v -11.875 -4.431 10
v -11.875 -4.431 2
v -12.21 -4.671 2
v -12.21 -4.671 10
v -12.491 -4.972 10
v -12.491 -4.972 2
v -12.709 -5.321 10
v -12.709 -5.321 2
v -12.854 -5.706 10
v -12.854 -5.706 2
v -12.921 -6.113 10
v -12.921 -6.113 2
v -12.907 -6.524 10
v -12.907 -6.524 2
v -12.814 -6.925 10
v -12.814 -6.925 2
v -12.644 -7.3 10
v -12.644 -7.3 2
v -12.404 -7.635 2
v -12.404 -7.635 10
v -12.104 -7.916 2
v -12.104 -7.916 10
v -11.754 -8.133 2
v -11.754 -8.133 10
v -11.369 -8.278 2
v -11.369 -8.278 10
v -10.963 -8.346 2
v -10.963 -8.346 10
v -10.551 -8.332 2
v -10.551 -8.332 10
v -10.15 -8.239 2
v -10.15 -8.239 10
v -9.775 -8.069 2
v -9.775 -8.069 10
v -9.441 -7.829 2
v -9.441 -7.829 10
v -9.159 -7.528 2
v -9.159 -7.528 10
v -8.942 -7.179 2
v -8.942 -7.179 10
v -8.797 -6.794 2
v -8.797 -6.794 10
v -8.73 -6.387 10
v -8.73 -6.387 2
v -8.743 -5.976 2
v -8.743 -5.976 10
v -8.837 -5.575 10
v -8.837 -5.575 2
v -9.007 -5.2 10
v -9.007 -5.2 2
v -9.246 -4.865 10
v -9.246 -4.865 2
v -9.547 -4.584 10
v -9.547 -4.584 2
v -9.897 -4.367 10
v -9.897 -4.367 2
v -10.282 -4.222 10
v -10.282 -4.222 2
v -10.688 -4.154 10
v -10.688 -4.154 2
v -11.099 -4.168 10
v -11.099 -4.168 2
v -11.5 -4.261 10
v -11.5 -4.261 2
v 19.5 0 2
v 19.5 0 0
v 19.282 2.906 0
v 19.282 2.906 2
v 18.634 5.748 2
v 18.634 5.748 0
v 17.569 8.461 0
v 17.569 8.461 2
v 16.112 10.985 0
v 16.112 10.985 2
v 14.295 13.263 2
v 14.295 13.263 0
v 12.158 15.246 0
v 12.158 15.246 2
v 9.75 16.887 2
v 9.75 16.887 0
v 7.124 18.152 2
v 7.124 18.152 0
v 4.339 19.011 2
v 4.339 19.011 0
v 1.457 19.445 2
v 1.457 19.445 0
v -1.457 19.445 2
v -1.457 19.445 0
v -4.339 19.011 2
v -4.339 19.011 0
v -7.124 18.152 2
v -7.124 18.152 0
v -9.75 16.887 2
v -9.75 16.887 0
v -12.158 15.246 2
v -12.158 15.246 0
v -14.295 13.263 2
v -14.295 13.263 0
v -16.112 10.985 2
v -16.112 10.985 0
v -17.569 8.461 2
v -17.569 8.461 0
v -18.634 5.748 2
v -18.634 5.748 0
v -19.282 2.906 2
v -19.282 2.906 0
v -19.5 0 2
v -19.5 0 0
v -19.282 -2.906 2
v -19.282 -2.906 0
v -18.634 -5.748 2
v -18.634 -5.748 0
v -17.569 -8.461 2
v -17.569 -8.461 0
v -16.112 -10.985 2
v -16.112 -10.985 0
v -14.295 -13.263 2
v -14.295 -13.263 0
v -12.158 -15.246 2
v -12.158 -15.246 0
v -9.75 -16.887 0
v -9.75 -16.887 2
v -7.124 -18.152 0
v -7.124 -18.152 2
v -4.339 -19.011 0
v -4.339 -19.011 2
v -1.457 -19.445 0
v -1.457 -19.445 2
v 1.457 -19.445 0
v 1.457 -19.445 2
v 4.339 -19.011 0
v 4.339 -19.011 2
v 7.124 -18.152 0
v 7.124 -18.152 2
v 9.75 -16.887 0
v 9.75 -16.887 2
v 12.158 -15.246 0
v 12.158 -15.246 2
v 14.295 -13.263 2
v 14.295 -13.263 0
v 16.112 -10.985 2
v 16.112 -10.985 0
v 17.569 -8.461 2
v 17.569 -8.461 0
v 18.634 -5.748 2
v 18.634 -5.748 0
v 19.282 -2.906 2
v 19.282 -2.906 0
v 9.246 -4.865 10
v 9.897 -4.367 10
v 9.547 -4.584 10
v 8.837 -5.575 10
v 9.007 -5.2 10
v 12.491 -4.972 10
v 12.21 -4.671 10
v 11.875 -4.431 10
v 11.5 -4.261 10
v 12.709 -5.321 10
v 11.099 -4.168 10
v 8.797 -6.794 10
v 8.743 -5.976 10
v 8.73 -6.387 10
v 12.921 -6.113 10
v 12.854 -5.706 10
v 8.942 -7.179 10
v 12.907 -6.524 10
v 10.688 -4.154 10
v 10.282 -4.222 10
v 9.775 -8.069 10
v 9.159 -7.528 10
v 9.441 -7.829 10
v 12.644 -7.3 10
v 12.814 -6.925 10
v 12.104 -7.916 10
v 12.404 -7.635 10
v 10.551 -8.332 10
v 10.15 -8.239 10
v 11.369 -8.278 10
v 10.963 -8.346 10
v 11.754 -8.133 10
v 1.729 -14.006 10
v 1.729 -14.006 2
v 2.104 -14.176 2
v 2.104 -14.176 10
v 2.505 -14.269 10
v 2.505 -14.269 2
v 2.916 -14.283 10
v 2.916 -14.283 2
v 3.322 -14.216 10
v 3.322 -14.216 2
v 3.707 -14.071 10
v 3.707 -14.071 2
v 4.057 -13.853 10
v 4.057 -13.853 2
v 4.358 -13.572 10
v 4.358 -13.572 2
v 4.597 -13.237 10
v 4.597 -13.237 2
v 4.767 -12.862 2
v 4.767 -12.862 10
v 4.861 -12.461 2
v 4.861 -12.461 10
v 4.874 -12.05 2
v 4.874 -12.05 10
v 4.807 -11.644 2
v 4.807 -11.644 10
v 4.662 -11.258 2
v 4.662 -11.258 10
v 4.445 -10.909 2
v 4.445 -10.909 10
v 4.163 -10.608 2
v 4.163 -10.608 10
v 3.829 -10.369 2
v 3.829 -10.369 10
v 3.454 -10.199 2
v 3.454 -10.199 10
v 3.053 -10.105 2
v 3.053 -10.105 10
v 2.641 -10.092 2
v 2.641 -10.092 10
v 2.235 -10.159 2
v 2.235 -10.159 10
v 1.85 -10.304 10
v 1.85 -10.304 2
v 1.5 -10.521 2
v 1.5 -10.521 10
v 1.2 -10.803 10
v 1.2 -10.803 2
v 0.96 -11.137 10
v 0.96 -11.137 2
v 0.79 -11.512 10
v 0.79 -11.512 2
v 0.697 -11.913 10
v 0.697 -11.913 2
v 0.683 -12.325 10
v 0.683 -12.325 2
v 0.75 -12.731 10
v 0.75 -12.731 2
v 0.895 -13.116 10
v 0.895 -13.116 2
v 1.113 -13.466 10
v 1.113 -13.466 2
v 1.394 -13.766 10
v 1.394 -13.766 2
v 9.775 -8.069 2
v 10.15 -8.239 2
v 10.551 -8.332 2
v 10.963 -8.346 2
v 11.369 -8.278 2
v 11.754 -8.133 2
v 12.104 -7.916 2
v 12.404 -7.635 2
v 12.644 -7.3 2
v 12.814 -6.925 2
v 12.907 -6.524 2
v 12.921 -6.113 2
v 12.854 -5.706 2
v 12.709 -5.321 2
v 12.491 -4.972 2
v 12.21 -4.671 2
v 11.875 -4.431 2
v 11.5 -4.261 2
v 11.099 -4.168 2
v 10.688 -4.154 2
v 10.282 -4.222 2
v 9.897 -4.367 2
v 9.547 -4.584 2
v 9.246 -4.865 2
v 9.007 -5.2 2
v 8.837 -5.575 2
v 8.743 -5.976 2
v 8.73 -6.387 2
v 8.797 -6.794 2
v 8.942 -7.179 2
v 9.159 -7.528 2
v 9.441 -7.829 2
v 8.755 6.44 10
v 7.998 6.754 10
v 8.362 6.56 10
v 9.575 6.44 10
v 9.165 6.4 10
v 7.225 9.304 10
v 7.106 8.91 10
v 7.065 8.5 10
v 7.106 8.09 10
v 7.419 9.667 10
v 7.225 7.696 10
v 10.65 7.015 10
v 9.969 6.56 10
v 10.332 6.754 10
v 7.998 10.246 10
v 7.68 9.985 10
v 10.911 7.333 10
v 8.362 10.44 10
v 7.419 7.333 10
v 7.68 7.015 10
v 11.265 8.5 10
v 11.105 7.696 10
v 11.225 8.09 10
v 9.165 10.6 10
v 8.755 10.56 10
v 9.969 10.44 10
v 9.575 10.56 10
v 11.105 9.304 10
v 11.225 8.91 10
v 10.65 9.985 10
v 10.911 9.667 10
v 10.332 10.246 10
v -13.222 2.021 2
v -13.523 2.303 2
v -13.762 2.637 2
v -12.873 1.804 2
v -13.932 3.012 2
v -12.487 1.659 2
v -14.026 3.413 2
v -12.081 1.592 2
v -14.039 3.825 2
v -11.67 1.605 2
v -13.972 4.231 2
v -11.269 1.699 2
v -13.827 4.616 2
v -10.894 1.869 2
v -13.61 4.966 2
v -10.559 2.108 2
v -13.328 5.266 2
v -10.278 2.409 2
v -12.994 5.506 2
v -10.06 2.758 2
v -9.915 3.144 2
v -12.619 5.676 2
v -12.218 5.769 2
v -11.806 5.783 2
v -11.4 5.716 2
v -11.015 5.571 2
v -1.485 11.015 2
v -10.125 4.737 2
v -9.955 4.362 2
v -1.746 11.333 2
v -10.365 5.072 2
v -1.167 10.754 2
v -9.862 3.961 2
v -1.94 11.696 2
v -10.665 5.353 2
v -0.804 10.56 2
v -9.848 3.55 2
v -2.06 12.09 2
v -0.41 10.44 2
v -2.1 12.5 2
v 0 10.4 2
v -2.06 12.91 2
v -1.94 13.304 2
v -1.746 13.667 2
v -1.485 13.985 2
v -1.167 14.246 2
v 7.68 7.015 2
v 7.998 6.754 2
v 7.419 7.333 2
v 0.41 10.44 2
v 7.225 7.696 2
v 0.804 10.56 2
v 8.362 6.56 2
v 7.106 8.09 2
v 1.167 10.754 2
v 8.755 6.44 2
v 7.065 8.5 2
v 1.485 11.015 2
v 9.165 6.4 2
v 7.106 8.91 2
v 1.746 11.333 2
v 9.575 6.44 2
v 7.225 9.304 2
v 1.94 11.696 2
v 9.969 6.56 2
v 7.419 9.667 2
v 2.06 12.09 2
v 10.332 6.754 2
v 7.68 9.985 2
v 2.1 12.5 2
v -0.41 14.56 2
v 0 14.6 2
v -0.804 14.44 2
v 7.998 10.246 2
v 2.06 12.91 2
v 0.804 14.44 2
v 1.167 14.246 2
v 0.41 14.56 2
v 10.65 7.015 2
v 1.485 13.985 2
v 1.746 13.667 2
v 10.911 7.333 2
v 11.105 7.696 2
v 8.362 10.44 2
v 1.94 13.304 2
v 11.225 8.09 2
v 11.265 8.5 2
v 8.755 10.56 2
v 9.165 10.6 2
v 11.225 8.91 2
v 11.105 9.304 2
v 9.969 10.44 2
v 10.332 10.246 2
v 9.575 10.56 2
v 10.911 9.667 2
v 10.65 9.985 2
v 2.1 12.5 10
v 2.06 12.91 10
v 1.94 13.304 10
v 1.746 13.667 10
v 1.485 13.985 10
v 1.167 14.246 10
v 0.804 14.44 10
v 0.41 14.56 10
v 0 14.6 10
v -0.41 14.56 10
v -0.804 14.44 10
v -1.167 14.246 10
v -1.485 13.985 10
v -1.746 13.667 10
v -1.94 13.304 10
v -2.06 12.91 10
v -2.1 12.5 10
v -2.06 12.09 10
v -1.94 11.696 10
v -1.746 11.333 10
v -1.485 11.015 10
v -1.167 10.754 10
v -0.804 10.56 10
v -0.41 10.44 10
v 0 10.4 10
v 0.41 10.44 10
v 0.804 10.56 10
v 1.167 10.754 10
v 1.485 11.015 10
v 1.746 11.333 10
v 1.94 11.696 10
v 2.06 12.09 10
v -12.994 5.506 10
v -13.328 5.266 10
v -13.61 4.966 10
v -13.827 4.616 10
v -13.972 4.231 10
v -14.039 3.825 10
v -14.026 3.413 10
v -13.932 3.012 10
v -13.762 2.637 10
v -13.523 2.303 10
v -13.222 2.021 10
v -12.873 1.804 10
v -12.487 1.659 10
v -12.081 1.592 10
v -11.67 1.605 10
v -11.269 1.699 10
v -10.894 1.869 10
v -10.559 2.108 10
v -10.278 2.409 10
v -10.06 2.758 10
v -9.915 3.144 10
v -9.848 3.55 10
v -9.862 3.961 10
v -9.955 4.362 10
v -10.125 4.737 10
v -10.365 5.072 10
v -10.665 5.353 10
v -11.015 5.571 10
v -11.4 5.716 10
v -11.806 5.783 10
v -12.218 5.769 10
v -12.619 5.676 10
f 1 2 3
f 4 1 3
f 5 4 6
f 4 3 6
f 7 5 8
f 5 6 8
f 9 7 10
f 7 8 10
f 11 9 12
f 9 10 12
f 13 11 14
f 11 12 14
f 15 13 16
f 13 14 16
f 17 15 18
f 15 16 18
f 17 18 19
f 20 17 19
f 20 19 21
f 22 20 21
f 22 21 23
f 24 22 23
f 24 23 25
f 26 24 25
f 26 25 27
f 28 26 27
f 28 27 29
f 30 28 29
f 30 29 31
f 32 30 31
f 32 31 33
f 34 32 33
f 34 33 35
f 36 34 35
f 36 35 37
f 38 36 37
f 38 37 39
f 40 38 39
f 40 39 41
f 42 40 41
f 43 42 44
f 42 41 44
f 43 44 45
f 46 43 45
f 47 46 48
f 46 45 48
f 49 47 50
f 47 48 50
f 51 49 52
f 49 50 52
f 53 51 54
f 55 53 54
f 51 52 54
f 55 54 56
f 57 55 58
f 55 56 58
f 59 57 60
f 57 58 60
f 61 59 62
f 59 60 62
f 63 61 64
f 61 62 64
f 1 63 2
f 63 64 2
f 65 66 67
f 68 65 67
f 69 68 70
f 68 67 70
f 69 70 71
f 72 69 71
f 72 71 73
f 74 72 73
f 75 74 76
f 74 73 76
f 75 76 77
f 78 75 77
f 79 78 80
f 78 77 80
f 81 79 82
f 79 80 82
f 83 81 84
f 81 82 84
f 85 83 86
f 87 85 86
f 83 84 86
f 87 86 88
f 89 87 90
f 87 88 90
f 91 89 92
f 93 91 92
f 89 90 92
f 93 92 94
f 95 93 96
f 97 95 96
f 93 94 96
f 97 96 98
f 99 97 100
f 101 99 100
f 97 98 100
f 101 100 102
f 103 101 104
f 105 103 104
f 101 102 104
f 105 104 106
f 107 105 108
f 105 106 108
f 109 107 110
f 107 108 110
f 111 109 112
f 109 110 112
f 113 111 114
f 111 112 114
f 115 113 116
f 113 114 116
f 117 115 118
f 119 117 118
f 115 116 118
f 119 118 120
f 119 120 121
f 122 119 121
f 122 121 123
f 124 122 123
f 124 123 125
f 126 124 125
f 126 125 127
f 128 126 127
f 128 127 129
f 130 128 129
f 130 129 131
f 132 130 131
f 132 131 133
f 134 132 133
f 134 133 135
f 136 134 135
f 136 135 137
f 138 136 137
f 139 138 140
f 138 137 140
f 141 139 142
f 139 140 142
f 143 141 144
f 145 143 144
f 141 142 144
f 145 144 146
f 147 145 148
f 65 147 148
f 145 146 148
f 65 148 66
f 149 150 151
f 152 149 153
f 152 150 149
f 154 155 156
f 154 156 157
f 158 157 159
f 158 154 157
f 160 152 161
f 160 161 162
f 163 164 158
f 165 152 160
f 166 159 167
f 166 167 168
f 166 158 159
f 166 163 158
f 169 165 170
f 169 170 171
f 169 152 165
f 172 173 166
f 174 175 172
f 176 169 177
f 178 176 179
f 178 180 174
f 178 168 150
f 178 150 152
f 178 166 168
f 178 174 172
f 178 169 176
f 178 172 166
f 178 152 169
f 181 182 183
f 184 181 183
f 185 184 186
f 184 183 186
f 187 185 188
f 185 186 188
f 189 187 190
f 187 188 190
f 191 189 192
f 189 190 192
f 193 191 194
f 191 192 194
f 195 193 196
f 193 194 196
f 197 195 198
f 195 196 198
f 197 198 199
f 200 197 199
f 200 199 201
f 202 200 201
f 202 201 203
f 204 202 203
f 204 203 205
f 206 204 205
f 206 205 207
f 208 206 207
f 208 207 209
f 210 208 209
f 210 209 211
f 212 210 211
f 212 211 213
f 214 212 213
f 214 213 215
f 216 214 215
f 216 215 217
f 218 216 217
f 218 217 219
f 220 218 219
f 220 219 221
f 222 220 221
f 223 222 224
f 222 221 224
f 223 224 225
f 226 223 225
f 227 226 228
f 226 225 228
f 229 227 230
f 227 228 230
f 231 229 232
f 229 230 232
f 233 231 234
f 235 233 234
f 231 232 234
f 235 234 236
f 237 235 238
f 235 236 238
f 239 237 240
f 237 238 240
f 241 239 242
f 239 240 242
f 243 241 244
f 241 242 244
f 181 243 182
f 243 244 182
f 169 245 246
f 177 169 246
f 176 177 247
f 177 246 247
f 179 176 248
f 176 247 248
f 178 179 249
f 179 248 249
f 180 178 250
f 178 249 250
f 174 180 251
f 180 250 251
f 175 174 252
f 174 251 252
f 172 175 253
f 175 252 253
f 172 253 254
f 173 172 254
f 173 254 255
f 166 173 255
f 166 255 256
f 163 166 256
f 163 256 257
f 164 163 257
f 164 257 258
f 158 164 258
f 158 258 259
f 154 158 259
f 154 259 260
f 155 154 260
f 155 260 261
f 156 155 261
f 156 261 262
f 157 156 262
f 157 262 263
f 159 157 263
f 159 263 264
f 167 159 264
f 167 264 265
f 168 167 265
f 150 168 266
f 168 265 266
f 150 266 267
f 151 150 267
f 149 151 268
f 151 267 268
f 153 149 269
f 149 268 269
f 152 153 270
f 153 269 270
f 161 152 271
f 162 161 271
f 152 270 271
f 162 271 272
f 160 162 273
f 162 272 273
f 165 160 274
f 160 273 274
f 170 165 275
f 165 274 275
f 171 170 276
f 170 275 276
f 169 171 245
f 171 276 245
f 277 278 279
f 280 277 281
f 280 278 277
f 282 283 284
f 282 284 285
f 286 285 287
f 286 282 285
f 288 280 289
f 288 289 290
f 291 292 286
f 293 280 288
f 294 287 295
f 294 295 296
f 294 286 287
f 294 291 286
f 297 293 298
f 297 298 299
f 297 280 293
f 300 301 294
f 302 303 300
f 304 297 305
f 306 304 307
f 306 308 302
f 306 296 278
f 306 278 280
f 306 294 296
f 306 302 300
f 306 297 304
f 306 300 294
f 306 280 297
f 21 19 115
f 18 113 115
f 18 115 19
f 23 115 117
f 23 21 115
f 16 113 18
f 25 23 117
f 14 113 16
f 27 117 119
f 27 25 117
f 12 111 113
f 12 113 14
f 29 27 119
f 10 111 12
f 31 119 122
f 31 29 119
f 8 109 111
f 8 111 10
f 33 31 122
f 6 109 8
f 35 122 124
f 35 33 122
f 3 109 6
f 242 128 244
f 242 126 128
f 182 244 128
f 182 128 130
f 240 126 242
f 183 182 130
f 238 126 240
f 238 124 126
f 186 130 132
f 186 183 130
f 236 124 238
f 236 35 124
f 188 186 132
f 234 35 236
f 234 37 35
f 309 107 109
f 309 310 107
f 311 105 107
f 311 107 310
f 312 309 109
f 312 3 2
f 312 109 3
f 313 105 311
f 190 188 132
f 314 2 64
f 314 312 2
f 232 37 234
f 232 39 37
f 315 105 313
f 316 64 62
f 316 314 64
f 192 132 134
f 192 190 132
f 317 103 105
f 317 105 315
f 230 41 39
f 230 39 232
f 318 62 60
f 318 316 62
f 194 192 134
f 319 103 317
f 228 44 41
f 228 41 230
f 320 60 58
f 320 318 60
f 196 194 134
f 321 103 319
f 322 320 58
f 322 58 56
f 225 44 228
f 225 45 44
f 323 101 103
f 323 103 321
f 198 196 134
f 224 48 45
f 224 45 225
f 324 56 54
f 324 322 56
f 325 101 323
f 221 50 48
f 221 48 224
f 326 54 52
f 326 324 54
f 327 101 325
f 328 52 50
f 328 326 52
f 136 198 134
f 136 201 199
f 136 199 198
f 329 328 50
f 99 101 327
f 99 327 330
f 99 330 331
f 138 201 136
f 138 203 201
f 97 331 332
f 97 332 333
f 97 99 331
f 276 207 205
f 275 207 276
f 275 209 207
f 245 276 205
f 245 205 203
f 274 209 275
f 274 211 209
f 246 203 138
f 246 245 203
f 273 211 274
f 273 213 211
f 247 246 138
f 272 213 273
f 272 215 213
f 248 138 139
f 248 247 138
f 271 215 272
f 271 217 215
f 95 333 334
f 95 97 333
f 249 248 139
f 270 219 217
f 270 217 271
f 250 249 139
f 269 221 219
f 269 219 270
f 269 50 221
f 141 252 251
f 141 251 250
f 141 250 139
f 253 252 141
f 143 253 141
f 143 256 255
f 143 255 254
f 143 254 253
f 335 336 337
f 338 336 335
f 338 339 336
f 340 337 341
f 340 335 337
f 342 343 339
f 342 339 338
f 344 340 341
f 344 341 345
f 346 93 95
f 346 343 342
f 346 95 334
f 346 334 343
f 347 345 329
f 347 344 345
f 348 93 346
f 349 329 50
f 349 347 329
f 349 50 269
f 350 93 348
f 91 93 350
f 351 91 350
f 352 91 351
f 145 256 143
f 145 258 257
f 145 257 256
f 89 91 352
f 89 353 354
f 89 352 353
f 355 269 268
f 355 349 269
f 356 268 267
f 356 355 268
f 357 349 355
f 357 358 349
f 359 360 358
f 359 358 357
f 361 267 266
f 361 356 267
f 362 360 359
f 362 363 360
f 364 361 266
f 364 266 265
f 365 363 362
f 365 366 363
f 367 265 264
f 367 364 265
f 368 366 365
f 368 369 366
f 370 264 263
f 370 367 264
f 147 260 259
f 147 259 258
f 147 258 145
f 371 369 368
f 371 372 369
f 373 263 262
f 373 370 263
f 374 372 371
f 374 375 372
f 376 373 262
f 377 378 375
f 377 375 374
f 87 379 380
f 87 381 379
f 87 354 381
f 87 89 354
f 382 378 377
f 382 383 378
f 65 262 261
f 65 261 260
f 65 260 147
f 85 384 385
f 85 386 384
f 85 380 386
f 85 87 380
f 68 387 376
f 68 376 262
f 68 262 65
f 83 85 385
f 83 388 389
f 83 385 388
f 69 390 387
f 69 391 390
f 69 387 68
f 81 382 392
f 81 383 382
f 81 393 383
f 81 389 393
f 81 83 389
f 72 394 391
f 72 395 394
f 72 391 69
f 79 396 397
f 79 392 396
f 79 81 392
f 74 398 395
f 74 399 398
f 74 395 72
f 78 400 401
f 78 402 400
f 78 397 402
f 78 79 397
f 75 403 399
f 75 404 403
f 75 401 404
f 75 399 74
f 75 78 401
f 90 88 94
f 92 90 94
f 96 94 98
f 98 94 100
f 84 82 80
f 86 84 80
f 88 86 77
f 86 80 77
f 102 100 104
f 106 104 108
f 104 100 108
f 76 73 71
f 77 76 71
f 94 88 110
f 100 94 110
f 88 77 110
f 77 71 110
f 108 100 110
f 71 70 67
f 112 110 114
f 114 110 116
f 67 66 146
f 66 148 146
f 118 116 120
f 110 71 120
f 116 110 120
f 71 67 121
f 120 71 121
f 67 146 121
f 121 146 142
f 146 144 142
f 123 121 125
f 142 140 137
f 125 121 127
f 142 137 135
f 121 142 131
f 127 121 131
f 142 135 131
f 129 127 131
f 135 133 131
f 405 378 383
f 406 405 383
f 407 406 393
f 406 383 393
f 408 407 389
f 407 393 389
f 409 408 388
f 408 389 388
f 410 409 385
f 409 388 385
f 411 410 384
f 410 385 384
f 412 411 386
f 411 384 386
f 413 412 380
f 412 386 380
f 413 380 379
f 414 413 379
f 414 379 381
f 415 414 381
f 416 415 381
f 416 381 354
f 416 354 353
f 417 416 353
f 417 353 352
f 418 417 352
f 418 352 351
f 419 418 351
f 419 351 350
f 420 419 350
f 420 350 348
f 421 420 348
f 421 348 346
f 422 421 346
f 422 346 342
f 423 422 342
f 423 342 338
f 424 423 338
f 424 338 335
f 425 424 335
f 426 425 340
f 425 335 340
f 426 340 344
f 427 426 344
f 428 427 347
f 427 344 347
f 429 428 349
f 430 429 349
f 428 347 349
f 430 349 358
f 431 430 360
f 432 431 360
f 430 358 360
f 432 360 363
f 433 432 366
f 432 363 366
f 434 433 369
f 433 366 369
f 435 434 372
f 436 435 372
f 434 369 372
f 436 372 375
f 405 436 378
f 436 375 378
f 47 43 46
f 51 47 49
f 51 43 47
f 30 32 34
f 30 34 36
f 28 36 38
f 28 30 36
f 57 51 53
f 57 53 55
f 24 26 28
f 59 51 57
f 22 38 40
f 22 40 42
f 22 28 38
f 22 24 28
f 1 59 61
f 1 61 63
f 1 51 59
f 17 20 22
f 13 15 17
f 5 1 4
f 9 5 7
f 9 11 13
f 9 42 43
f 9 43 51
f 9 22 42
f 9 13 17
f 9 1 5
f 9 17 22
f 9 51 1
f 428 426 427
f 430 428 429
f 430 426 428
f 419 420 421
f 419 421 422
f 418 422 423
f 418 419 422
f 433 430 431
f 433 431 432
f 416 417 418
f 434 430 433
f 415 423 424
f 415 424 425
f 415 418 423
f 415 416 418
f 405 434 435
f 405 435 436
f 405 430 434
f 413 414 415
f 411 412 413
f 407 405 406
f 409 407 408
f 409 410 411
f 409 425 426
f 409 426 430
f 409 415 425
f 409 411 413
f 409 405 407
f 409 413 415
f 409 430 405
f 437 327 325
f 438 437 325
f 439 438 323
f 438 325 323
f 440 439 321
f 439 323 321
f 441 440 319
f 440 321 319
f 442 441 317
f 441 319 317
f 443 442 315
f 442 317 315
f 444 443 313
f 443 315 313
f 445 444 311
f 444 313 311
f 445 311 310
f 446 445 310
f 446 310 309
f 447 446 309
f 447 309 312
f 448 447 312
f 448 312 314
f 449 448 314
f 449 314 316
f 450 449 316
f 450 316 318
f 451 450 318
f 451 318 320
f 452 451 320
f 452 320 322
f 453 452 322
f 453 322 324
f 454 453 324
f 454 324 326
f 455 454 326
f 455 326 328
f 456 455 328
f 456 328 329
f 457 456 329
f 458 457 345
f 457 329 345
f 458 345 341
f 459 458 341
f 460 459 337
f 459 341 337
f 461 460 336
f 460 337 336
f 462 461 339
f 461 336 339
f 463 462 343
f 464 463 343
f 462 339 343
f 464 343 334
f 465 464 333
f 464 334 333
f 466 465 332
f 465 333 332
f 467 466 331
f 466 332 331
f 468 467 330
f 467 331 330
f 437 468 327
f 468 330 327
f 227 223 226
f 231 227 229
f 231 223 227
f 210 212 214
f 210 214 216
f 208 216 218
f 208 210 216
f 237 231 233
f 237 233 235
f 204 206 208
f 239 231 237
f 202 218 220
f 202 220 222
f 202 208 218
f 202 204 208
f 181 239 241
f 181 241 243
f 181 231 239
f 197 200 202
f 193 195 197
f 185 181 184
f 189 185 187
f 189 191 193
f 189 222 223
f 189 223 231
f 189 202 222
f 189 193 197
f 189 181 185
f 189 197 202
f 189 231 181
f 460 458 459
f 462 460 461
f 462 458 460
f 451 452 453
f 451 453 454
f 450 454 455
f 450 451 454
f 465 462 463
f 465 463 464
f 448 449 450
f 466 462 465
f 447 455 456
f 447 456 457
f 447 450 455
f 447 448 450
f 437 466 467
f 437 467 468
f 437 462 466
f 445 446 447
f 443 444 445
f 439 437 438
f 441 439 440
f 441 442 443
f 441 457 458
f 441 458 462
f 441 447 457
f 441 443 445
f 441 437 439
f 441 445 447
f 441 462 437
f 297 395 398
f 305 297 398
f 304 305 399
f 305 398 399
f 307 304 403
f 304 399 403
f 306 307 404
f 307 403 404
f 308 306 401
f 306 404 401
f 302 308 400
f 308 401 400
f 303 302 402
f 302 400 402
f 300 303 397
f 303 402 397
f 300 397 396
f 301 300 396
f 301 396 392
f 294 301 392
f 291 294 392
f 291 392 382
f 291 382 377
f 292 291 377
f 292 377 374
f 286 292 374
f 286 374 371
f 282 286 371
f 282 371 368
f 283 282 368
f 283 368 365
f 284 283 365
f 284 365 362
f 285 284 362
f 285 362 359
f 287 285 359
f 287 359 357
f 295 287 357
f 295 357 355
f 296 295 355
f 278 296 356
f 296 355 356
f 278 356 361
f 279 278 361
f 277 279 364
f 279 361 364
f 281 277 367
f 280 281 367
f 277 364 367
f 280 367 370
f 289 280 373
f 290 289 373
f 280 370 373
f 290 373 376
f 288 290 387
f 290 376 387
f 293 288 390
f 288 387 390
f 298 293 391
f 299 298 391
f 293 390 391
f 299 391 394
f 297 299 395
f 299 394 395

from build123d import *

# Parameters (mm, degrees)
F0_R            = 19.5
F0_R_2          = 2.1
F1_DEPTH        = 2
F2_DEPTH        = 10
F2_COPIES_COUNT = 3


# Not quite as in the source:
# - a pattern or mirror of a feature is missing from the dataset's text; its kind, count and spacing are read off the source's solid


with BuildPart() as f1:
    # F0 (on Top) → F1 (new body)
    with BuildSketch(Plane.XY):
        Circle(F0_R)
        with Locations((9.1651513899, 8.5)):
            Circle(F0_R_2, mode=Mode.SUBTRACT)
        with Locations((0, 12.5)):
            Circle(F0_R_2, mode=Mode.SUBTRACT)
    extrude(amount=F1_DEPTH)

    # F0 (on Top) → F2 (join)
    with BuildSketch(Plane.XY):
        with Locations((0, 12.5)):
            Circle(F0_R_2)
        with Locations((9.1651513899, 8.5)):
            Circle(F0_R_2)
    f2 = extrude(amount=F2_DEPTH)

    # F2_copies: F2 ×3 about axis
    f2_copies_axis = Axis((0, 0, 0), (0, 0, 1))
    for i in range(1, F2_COPIES_COUNT):
        add(f2.rotate(f2_copies_axis, i * 360 / F2_COPIES_COUNT))


solid = f1.part
